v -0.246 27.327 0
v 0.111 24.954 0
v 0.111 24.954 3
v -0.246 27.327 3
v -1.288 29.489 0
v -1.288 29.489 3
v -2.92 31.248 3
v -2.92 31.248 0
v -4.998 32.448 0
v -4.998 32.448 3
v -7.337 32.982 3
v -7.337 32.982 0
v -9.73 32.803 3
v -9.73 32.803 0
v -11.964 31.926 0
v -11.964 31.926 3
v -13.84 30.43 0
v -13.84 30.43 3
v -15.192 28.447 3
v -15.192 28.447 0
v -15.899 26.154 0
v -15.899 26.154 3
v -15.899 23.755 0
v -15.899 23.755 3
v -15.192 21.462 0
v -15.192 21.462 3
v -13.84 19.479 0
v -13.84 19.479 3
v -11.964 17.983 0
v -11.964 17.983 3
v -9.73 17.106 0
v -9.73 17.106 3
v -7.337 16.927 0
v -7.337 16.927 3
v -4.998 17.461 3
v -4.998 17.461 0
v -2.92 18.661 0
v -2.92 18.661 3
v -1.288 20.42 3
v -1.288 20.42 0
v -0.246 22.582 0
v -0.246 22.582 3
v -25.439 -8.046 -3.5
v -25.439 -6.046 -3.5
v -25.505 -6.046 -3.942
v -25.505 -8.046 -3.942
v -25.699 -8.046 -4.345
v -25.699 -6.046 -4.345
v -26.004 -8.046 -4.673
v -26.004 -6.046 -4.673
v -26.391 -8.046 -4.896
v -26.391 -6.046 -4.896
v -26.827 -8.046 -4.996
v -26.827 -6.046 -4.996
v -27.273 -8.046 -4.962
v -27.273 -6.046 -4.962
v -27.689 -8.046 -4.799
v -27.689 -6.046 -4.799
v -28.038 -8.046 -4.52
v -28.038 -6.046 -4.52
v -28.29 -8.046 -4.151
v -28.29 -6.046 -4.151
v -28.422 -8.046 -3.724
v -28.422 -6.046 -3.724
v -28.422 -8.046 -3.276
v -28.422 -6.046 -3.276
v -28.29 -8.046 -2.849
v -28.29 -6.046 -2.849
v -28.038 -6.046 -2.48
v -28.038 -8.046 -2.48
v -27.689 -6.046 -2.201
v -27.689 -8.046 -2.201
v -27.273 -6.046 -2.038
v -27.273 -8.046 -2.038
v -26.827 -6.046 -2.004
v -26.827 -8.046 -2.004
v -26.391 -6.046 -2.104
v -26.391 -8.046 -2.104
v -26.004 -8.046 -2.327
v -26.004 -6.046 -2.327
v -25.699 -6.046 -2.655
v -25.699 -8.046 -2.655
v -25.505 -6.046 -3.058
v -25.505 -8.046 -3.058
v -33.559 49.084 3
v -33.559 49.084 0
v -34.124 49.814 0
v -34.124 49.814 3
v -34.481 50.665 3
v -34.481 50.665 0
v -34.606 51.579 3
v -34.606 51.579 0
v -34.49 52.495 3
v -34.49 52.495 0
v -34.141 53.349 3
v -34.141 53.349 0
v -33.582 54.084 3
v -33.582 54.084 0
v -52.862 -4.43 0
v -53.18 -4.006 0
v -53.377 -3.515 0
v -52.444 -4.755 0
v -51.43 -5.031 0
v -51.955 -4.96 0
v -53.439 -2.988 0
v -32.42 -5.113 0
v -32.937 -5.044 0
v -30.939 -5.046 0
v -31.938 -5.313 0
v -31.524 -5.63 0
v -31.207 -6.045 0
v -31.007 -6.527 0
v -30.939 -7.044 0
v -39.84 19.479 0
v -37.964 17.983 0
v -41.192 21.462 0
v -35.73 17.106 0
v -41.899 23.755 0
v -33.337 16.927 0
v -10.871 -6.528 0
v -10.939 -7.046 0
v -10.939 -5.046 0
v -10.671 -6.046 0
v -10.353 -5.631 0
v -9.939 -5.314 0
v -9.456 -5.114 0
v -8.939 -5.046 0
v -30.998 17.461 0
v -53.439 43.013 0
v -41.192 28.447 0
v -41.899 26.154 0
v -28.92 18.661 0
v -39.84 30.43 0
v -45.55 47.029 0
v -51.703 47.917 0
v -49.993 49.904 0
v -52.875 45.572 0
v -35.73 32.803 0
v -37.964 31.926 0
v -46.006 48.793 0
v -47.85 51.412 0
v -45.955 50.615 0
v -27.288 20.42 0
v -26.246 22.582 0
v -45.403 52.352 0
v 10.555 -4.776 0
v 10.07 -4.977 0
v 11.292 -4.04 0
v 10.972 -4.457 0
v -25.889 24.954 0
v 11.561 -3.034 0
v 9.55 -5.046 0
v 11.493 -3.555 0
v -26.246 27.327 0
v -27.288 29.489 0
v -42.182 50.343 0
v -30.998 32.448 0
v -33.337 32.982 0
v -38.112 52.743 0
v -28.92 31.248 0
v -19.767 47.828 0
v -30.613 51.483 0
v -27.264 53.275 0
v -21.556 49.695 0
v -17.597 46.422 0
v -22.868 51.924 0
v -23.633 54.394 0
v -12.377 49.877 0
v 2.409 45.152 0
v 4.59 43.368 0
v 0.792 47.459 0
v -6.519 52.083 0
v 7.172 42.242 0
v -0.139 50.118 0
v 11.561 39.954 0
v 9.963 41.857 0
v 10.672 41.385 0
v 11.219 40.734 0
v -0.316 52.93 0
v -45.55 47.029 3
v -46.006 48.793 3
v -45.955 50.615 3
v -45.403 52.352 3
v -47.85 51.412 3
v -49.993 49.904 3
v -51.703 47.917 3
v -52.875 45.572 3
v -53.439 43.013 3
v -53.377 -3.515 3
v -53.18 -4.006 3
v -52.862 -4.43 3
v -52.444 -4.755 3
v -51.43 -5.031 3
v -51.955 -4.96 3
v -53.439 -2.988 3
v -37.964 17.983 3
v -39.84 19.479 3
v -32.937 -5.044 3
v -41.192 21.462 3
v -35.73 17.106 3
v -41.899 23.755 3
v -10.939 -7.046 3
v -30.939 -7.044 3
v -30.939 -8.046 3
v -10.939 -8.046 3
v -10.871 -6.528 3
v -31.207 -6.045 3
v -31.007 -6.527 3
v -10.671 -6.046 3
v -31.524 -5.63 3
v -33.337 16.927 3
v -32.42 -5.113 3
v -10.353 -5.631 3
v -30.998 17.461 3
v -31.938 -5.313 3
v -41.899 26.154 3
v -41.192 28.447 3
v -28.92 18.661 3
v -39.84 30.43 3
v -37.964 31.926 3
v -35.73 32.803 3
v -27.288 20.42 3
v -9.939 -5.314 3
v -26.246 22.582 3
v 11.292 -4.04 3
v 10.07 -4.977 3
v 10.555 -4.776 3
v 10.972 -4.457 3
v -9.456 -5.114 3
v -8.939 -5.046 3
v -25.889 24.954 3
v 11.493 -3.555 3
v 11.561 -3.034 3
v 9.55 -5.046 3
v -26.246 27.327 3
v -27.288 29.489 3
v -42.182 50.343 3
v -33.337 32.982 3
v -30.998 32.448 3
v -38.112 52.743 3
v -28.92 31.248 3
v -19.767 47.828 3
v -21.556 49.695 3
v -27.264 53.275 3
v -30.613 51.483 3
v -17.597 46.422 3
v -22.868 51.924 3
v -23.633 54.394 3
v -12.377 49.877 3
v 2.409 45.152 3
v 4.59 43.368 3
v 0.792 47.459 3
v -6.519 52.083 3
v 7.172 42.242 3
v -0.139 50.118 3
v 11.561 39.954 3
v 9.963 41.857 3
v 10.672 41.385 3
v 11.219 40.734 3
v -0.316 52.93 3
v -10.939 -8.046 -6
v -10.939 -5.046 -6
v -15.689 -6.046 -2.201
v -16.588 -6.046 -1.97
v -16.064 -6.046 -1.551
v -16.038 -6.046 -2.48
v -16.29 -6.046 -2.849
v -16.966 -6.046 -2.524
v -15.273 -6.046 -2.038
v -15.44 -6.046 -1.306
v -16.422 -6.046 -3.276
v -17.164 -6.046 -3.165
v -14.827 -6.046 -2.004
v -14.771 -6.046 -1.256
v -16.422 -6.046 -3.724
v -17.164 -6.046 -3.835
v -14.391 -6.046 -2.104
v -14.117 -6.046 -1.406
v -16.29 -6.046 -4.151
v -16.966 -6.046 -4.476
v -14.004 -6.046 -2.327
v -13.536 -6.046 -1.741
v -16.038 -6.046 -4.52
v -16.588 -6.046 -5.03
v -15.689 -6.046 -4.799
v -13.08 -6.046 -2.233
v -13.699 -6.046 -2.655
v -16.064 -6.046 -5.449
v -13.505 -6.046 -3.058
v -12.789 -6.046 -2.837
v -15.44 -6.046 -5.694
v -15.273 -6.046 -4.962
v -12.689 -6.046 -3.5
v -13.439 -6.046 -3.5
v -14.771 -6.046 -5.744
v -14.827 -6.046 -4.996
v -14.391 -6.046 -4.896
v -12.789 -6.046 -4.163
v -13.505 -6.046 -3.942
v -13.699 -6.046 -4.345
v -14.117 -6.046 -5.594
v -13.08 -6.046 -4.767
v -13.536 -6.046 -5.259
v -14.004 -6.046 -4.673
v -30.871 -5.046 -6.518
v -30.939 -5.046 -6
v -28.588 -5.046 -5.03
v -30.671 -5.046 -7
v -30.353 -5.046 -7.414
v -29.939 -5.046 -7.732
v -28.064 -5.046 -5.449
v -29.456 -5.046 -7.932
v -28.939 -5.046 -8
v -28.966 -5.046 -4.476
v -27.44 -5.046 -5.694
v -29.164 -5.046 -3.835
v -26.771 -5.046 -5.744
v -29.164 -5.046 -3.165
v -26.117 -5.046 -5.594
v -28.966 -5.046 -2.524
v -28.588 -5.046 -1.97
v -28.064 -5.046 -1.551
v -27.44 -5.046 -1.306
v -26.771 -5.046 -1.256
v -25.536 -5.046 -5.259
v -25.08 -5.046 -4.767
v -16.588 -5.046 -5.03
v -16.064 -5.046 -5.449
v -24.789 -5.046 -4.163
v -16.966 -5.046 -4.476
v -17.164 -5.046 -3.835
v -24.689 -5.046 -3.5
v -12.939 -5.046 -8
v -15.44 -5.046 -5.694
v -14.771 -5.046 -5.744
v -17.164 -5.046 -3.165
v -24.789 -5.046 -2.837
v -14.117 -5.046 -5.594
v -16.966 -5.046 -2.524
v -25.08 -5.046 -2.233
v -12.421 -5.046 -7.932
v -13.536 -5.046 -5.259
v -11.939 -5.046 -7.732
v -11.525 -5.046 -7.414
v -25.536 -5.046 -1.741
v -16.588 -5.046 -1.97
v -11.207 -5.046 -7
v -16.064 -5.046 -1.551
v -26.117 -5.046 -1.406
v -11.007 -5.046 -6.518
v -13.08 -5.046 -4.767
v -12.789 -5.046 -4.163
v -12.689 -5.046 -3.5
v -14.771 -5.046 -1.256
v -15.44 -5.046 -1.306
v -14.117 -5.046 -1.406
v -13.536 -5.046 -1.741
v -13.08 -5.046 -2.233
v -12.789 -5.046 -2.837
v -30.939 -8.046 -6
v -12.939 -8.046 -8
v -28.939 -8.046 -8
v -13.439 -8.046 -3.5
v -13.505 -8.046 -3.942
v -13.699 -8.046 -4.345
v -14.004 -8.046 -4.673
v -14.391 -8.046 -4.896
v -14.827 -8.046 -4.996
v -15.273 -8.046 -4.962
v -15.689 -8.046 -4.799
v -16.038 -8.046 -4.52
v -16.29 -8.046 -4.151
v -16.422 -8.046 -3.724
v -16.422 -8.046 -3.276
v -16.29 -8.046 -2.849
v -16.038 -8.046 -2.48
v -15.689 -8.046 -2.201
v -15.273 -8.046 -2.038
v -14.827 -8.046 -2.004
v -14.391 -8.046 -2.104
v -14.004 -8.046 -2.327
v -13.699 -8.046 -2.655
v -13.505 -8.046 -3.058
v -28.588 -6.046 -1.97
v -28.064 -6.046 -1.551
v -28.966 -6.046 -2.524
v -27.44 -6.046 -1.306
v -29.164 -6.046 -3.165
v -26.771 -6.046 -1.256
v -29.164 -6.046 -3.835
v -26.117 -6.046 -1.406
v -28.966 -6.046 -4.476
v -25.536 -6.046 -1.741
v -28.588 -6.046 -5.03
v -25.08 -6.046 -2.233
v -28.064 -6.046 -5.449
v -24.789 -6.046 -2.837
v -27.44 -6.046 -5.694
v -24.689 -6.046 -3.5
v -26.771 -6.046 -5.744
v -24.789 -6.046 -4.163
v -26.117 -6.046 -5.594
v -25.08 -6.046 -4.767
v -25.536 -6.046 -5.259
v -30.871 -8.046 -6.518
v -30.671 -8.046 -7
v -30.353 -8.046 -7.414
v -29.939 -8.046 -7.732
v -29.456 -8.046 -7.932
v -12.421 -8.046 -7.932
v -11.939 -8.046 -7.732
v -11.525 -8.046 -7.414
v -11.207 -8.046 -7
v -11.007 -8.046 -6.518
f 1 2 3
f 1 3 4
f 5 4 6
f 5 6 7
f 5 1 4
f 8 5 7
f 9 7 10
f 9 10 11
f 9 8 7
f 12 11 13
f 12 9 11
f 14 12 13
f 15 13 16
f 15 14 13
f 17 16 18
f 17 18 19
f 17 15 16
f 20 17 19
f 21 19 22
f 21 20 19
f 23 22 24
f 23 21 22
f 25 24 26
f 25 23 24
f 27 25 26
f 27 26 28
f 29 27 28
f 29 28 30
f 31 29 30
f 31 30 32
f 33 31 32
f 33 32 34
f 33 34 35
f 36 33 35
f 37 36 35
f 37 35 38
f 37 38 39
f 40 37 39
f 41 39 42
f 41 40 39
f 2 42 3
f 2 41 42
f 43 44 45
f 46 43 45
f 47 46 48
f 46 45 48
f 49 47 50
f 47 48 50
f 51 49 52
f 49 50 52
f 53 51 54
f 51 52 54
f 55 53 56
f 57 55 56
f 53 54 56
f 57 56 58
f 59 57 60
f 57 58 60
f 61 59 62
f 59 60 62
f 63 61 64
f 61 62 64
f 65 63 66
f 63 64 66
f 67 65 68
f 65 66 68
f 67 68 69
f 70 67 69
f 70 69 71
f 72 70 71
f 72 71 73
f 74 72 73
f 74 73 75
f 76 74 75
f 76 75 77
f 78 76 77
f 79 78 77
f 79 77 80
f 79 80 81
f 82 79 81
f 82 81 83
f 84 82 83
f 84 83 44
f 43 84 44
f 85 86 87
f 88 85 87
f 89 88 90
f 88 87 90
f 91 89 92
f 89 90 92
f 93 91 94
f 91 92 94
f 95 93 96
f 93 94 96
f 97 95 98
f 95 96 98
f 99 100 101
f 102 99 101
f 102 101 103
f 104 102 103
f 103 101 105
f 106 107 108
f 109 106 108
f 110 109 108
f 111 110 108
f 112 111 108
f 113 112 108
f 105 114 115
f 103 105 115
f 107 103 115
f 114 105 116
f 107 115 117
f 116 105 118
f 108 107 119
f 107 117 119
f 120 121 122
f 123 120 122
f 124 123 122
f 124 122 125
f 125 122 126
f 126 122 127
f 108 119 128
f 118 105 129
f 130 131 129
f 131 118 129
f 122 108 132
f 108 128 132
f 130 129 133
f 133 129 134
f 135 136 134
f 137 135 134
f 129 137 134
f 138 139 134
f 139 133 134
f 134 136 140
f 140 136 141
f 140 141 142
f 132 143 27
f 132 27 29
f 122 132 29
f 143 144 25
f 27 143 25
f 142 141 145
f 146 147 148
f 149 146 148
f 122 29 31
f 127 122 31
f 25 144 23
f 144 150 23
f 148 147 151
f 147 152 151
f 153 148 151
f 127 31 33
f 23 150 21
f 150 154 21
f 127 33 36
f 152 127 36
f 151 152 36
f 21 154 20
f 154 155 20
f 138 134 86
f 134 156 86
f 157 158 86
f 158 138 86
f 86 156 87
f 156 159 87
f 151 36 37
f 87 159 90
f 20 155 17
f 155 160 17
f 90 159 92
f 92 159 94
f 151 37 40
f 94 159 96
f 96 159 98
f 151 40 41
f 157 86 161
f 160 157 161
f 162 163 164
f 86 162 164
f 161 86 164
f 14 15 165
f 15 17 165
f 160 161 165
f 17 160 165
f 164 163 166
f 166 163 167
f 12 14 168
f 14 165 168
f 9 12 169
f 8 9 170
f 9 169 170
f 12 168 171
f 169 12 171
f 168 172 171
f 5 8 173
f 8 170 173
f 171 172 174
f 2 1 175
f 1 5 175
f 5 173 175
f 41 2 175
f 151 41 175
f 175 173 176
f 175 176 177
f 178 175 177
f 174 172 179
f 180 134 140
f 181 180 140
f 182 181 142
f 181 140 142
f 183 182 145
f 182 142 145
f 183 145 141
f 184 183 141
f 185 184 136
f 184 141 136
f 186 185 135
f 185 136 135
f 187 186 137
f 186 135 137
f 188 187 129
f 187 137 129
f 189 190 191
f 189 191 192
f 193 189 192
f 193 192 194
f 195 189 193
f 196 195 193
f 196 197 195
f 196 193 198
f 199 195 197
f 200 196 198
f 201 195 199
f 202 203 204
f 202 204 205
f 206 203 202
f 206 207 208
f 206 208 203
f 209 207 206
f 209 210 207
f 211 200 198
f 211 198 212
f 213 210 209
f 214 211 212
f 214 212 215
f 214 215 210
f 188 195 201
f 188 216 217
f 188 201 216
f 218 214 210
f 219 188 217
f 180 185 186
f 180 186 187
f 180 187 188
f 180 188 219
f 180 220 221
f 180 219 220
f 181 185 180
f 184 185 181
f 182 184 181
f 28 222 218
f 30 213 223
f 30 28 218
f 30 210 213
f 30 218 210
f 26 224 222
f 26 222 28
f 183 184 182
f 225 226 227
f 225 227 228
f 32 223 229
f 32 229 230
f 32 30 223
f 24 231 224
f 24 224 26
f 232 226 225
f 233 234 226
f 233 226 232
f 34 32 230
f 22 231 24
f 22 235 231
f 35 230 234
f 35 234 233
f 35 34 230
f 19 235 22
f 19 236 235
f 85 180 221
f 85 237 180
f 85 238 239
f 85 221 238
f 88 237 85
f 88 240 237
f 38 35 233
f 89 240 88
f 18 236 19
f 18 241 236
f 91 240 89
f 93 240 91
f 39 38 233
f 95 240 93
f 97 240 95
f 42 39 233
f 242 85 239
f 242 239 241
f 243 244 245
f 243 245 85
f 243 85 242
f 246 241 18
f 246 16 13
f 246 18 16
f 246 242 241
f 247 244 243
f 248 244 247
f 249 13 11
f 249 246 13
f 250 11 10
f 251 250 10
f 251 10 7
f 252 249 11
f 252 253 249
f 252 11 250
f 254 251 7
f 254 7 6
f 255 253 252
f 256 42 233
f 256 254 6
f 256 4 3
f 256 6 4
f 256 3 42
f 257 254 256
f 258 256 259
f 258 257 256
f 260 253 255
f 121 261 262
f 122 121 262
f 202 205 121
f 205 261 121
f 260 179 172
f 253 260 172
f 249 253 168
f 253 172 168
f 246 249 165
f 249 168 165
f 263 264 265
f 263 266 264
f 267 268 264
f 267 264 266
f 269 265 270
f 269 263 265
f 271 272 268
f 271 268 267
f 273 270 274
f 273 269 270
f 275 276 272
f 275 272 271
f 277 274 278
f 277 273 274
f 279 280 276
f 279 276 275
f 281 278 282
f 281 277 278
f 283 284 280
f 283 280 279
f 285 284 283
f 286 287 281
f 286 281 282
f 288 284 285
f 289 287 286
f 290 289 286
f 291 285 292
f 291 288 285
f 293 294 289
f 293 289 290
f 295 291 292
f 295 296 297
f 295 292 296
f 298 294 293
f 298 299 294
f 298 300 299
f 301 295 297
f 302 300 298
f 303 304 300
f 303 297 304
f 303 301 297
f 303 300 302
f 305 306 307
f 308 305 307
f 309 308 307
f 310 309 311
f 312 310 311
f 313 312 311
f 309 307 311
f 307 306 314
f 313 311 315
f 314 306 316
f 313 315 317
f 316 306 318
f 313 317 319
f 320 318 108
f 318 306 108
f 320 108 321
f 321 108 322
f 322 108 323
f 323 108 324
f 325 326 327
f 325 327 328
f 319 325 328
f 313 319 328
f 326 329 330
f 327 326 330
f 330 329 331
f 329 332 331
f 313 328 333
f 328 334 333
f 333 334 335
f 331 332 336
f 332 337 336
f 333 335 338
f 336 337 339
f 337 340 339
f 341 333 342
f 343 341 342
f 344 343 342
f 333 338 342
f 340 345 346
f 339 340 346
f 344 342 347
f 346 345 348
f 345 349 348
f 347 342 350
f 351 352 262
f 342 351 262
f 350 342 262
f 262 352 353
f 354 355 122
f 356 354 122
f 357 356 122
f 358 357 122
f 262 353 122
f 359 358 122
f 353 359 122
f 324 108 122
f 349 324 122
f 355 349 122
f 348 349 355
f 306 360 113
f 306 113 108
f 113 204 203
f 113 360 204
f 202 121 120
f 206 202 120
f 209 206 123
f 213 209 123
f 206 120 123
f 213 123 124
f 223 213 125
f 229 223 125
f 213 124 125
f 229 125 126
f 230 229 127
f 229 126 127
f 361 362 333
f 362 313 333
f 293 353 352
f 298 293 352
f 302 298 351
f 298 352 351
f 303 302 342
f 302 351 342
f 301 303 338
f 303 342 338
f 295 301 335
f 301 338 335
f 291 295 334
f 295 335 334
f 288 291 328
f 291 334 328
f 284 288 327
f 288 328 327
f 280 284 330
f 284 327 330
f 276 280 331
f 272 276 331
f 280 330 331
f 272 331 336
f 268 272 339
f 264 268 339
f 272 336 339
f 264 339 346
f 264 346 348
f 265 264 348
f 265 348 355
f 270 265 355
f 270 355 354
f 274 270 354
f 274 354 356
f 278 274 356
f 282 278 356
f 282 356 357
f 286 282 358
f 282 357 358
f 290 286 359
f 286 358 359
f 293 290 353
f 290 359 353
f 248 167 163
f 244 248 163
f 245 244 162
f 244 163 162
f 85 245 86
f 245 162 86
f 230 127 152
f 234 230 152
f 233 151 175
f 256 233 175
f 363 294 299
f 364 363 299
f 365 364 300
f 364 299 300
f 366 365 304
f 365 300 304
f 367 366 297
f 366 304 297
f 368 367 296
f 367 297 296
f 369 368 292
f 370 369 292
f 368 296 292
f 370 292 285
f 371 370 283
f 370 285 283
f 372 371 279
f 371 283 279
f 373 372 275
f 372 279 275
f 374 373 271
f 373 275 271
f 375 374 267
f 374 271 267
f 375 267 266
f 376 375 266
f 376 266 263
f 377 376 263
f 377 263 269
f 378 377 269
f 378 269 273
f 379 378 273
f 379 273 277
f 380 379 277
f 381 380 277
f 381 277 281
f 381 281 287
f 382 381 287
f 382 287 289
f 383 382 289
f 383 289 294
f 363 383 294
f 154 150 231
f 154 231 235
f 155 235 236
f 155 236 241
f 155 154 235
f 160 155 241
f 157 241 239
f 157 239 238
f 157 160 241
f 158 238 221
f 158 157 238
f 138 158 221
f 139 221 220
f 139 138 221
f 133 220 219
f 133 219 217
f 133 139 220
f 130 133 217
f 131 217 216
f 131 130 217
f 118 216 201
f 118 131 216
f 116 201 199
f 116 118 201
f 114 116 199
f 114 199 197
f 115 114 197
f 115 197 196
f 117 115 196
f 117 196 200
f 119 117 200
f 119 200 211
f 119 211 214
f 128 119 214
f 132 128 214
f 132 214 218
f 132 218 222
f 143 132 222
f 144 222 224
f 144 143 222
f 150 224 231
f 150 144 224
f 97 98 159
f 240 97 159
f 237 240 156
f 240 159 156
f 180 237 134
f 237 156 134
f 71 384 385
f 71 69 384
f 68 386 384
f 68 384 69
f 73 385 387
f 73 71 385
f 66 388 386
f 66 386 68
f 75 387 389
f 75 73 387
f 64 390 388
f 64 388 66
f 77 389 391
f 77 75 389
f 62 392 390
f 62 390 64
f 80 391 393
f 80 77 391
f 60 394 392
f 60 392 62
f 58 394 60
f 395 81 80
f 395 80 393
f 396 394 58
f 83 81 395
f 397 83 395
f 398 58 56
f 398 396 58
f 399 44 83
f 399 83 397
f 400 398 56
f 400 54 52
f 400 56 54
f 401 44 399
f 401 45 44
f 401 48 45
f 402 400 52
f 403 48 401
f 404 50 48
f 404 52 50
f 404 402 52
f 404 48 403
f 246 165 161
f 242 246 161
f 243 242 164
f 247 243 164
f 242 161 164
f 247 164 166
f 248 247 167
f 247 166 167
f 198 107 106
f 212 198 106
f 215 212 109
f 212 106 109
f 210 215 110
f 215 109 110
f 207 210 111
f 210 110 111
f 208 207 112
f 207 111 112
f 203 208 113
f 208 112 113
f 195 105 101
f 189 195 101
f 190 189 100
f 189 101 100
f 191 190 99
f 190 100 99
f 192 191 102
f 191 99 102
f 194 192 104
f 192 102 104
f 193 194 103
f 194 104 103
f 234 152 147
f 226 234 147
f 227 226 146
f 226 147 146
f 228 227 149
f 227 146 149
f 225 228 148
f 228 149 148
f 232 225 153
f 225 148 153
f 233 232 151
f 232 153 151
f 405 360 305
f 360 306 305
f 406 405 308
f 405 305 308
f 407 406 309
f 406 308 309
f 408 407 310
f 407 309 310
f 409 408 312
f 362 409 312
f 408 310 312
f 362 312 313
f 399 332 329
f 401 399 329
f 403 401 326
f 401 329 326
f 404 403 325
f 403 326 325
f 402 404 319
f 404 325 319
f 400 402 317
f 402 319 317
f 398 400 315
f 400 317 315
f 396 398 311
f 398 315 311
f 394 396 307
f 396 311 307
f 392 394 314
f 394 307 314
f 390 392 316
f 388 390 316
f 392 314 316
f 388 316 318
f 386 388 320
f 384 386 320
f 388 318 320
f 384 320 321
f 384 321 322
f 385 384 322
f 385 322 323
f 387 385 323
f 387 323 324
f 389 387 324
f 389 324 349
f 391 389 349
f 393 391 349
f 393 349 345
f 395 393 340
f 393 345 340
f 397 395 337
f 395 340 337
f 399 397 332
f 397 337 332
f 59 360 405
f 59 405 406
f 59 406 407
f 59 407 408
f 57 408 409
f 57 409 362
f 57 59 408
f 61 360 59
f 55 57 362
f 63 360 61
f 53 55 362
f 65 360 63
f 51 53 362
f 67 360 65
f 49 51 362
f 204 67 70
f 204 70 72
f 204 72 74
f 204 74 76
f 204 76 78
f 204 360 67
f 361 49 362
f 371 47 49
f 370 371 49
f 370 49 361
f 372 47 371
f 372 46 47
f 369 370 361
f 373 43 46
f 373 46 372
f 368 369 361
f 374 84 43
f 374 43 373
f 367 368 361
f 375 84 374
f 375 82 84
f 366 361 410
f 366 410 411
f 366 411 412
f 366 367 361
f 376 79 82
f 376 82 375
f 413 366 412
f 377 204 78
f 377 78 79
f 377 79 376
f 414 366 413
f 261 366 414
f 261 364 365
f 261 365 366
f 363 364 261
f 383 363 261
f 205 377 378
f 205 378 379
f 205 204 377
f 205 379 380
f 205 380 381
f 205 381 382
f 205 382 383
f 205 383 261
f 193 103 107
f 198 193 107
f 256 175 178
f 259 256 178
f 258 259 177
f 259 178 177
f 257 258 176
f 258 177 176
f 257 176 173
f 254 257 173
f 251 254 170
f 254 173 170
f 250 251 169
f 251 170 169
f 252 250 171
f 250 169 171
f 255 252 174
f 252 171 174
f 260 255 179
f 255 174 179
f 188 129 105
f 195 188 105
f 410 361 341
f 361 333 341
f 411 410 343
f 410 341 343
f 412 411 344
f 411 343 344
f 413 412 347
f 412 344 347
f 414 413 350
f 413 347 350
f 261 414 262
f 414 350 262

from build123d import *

# Parameters (mm, degrees)
CROQUIS1_R              = 8.05
SALIENTE_EXTRUIR1_DEPTH = 3
CROQUIS2_W              = 20
CROQUIS2_H              = 3
SALIENTE_EXTRUIR2_DEPTH = 11
CROQUIS3_R              = 1.5
CORTAR_EXTRUIR1_DEPTH   = 3
REDONDEO2_R             = 2
CROQUIS4_R              = 2.25
CORTAR_EXTRUIR2_DEPTH   = 1


with BuildPart() as part:
    # Croquis1 → Saliente-Extruir1 (new body)
    with BuildSketch(Plane.XY):
        with BuildLine():
            Line((-30.938838255, -8.045633461), (-10.938838255, -8.045633461))
            Line((-10.938838255, -8.045633461), (-10.938838255, -7.045633461))
            ThreePointArc((-10.938838255, -7.045633461), (-10.353051818, -5.631419899), (-8.938838255, -5.045633461))
            Line((-8.938838255, -5.045633461), (9.549778797, -5.045633461))
            ThreePointArc((9.549778797, -5.045633461), (10.972041616, -4.456512912), (11.561162165, -3.034250093))
            Line((11.561162165, -3.034250093), (11.561162165, 39.954366539))
            ThreePointArc((11.561162165, 39.954366539), (10.968432365, 41.078847271), (9.963268776, 41.856942185))
            ThreePointArc((9.963268776, 41.856942185), (2.408997489, 45.151653306), (-0.316073105, 52.929578886))
            ThreePointArc((-0.316073105, 52.929578886), (-9.509697497, 51.145023059), (-17.59663302, 46.421799285))
            ThreePointArc((-17.59663302, 46.421799285), (-21.556040731, 49.695374216), (-23.633455433, 54.394049605))
            ThreePointArc((-23.633455433, 54.394049605), (-28.98150225, 52.459242343), (-33.559009638, 49.084111234))
            ThreePointArc((-33.559009638, 49.084111234), (-34.606059472, 51.579310047), (-33.582063508, 54.084058086))
            ThreePointArc((-33.582063508, 54.084058086), (-40.220863613, 51.667488325), (-45.549660534, 47.028803207))
            ThreePointArc((-45.549660534, 47.028803207), (-46.044361143, 49.705869681), (-45.402636247, 52.35154592))
            ThreePointArc((-45.402636247, 52.35154592), (-50.909137078, 48.962948767), (-53.438838255, 43.012759358))
            Line((-53.438838255, 43.012759358), (-53.438838255, -2.988324387))
            ThreePointArc((-53.438838255, -2.988324387), (-52.861811755, -4.429826639), (-51.430168576, -5.030897458))
            Line((-51.430168576, -5.030897458), (-32.937399988, -5.044196229))
            ThreePointArc((-32.937399988, -5.044196229), (-31.52411628, -5.630490745), (-30.938838255, -7.044195711))
            Line((-30.938838255, -7.044195711), (-30.938838255, -8.045633461))
        make_face()
        with Locations((-7.938838255, 24.954366539)):
            Circle(CROQUIS1_R, mode=Mode.SUBTRACT)
        with Locations((-33.938838255, 24.954366539)):
            Circle(CROQUIS1_R, mode=Mode.SUBTRACT)
    extrude(amount=SALIENTE_EXTRUIR1_DEPTH)

    # Croquis2 → Saliente-Extruir2 (add)
    with BuildSketch(Plane.XY.offset(3)):
        with Locations((-20.938838255, -6.545633461)):
            Rectangle(CROQUIS2_W, CROQUIS2_H)
    extrude(amount=-SALIENTE_EXTRUIR2_DEPTH)

    # Croquis3 → Cortar-Extruir1 (cut)
    with BuildSketch(Plane(origin=(0, -5.045633461, 0), x_dir=(1, 0, 0), z_dir=(0, 1, 0))):
        with Locations((-14.938838255, 3.5)):
            Circle(CROQUIS3_R)
        with Locations((-26.938838255, 3.5)):
            Circle(CROQUIS3_R)
    extrude(amount=-CORTAR_EXTRUIR1_DEPTH, mode=Mode.SUBTRACT)

    # Redondeo2
    redondeo2_edges = [part.edges().sort_by_distance(p)[0] for p in [
        (-30.938838255, -6.545633461, -8),
        (-10.938838255, -6.545633461, -8),
    ]]
    fillet(redondeo2_edges, radius=REDONDEO2_R)

    # Croquis4 → Cortar-Extruir2 (cut)
    with BuildSketch(Plane(origin=(0, -5.045633461, 0), x_dir=(1, 0, 0), z_dir=(0, 1, 0))):
        with Locations((-26.938838255, 3.5)):
            Circle(CROQUIS4_R)
        with Locations((-14.938838255, 3.5)):
            Circle(CROQUIS4_R)
    extrude(amount=-CORTAR_EXTRUIR2_DEPTH, mode=Mode.SUBTRACT)


solid = part.part
